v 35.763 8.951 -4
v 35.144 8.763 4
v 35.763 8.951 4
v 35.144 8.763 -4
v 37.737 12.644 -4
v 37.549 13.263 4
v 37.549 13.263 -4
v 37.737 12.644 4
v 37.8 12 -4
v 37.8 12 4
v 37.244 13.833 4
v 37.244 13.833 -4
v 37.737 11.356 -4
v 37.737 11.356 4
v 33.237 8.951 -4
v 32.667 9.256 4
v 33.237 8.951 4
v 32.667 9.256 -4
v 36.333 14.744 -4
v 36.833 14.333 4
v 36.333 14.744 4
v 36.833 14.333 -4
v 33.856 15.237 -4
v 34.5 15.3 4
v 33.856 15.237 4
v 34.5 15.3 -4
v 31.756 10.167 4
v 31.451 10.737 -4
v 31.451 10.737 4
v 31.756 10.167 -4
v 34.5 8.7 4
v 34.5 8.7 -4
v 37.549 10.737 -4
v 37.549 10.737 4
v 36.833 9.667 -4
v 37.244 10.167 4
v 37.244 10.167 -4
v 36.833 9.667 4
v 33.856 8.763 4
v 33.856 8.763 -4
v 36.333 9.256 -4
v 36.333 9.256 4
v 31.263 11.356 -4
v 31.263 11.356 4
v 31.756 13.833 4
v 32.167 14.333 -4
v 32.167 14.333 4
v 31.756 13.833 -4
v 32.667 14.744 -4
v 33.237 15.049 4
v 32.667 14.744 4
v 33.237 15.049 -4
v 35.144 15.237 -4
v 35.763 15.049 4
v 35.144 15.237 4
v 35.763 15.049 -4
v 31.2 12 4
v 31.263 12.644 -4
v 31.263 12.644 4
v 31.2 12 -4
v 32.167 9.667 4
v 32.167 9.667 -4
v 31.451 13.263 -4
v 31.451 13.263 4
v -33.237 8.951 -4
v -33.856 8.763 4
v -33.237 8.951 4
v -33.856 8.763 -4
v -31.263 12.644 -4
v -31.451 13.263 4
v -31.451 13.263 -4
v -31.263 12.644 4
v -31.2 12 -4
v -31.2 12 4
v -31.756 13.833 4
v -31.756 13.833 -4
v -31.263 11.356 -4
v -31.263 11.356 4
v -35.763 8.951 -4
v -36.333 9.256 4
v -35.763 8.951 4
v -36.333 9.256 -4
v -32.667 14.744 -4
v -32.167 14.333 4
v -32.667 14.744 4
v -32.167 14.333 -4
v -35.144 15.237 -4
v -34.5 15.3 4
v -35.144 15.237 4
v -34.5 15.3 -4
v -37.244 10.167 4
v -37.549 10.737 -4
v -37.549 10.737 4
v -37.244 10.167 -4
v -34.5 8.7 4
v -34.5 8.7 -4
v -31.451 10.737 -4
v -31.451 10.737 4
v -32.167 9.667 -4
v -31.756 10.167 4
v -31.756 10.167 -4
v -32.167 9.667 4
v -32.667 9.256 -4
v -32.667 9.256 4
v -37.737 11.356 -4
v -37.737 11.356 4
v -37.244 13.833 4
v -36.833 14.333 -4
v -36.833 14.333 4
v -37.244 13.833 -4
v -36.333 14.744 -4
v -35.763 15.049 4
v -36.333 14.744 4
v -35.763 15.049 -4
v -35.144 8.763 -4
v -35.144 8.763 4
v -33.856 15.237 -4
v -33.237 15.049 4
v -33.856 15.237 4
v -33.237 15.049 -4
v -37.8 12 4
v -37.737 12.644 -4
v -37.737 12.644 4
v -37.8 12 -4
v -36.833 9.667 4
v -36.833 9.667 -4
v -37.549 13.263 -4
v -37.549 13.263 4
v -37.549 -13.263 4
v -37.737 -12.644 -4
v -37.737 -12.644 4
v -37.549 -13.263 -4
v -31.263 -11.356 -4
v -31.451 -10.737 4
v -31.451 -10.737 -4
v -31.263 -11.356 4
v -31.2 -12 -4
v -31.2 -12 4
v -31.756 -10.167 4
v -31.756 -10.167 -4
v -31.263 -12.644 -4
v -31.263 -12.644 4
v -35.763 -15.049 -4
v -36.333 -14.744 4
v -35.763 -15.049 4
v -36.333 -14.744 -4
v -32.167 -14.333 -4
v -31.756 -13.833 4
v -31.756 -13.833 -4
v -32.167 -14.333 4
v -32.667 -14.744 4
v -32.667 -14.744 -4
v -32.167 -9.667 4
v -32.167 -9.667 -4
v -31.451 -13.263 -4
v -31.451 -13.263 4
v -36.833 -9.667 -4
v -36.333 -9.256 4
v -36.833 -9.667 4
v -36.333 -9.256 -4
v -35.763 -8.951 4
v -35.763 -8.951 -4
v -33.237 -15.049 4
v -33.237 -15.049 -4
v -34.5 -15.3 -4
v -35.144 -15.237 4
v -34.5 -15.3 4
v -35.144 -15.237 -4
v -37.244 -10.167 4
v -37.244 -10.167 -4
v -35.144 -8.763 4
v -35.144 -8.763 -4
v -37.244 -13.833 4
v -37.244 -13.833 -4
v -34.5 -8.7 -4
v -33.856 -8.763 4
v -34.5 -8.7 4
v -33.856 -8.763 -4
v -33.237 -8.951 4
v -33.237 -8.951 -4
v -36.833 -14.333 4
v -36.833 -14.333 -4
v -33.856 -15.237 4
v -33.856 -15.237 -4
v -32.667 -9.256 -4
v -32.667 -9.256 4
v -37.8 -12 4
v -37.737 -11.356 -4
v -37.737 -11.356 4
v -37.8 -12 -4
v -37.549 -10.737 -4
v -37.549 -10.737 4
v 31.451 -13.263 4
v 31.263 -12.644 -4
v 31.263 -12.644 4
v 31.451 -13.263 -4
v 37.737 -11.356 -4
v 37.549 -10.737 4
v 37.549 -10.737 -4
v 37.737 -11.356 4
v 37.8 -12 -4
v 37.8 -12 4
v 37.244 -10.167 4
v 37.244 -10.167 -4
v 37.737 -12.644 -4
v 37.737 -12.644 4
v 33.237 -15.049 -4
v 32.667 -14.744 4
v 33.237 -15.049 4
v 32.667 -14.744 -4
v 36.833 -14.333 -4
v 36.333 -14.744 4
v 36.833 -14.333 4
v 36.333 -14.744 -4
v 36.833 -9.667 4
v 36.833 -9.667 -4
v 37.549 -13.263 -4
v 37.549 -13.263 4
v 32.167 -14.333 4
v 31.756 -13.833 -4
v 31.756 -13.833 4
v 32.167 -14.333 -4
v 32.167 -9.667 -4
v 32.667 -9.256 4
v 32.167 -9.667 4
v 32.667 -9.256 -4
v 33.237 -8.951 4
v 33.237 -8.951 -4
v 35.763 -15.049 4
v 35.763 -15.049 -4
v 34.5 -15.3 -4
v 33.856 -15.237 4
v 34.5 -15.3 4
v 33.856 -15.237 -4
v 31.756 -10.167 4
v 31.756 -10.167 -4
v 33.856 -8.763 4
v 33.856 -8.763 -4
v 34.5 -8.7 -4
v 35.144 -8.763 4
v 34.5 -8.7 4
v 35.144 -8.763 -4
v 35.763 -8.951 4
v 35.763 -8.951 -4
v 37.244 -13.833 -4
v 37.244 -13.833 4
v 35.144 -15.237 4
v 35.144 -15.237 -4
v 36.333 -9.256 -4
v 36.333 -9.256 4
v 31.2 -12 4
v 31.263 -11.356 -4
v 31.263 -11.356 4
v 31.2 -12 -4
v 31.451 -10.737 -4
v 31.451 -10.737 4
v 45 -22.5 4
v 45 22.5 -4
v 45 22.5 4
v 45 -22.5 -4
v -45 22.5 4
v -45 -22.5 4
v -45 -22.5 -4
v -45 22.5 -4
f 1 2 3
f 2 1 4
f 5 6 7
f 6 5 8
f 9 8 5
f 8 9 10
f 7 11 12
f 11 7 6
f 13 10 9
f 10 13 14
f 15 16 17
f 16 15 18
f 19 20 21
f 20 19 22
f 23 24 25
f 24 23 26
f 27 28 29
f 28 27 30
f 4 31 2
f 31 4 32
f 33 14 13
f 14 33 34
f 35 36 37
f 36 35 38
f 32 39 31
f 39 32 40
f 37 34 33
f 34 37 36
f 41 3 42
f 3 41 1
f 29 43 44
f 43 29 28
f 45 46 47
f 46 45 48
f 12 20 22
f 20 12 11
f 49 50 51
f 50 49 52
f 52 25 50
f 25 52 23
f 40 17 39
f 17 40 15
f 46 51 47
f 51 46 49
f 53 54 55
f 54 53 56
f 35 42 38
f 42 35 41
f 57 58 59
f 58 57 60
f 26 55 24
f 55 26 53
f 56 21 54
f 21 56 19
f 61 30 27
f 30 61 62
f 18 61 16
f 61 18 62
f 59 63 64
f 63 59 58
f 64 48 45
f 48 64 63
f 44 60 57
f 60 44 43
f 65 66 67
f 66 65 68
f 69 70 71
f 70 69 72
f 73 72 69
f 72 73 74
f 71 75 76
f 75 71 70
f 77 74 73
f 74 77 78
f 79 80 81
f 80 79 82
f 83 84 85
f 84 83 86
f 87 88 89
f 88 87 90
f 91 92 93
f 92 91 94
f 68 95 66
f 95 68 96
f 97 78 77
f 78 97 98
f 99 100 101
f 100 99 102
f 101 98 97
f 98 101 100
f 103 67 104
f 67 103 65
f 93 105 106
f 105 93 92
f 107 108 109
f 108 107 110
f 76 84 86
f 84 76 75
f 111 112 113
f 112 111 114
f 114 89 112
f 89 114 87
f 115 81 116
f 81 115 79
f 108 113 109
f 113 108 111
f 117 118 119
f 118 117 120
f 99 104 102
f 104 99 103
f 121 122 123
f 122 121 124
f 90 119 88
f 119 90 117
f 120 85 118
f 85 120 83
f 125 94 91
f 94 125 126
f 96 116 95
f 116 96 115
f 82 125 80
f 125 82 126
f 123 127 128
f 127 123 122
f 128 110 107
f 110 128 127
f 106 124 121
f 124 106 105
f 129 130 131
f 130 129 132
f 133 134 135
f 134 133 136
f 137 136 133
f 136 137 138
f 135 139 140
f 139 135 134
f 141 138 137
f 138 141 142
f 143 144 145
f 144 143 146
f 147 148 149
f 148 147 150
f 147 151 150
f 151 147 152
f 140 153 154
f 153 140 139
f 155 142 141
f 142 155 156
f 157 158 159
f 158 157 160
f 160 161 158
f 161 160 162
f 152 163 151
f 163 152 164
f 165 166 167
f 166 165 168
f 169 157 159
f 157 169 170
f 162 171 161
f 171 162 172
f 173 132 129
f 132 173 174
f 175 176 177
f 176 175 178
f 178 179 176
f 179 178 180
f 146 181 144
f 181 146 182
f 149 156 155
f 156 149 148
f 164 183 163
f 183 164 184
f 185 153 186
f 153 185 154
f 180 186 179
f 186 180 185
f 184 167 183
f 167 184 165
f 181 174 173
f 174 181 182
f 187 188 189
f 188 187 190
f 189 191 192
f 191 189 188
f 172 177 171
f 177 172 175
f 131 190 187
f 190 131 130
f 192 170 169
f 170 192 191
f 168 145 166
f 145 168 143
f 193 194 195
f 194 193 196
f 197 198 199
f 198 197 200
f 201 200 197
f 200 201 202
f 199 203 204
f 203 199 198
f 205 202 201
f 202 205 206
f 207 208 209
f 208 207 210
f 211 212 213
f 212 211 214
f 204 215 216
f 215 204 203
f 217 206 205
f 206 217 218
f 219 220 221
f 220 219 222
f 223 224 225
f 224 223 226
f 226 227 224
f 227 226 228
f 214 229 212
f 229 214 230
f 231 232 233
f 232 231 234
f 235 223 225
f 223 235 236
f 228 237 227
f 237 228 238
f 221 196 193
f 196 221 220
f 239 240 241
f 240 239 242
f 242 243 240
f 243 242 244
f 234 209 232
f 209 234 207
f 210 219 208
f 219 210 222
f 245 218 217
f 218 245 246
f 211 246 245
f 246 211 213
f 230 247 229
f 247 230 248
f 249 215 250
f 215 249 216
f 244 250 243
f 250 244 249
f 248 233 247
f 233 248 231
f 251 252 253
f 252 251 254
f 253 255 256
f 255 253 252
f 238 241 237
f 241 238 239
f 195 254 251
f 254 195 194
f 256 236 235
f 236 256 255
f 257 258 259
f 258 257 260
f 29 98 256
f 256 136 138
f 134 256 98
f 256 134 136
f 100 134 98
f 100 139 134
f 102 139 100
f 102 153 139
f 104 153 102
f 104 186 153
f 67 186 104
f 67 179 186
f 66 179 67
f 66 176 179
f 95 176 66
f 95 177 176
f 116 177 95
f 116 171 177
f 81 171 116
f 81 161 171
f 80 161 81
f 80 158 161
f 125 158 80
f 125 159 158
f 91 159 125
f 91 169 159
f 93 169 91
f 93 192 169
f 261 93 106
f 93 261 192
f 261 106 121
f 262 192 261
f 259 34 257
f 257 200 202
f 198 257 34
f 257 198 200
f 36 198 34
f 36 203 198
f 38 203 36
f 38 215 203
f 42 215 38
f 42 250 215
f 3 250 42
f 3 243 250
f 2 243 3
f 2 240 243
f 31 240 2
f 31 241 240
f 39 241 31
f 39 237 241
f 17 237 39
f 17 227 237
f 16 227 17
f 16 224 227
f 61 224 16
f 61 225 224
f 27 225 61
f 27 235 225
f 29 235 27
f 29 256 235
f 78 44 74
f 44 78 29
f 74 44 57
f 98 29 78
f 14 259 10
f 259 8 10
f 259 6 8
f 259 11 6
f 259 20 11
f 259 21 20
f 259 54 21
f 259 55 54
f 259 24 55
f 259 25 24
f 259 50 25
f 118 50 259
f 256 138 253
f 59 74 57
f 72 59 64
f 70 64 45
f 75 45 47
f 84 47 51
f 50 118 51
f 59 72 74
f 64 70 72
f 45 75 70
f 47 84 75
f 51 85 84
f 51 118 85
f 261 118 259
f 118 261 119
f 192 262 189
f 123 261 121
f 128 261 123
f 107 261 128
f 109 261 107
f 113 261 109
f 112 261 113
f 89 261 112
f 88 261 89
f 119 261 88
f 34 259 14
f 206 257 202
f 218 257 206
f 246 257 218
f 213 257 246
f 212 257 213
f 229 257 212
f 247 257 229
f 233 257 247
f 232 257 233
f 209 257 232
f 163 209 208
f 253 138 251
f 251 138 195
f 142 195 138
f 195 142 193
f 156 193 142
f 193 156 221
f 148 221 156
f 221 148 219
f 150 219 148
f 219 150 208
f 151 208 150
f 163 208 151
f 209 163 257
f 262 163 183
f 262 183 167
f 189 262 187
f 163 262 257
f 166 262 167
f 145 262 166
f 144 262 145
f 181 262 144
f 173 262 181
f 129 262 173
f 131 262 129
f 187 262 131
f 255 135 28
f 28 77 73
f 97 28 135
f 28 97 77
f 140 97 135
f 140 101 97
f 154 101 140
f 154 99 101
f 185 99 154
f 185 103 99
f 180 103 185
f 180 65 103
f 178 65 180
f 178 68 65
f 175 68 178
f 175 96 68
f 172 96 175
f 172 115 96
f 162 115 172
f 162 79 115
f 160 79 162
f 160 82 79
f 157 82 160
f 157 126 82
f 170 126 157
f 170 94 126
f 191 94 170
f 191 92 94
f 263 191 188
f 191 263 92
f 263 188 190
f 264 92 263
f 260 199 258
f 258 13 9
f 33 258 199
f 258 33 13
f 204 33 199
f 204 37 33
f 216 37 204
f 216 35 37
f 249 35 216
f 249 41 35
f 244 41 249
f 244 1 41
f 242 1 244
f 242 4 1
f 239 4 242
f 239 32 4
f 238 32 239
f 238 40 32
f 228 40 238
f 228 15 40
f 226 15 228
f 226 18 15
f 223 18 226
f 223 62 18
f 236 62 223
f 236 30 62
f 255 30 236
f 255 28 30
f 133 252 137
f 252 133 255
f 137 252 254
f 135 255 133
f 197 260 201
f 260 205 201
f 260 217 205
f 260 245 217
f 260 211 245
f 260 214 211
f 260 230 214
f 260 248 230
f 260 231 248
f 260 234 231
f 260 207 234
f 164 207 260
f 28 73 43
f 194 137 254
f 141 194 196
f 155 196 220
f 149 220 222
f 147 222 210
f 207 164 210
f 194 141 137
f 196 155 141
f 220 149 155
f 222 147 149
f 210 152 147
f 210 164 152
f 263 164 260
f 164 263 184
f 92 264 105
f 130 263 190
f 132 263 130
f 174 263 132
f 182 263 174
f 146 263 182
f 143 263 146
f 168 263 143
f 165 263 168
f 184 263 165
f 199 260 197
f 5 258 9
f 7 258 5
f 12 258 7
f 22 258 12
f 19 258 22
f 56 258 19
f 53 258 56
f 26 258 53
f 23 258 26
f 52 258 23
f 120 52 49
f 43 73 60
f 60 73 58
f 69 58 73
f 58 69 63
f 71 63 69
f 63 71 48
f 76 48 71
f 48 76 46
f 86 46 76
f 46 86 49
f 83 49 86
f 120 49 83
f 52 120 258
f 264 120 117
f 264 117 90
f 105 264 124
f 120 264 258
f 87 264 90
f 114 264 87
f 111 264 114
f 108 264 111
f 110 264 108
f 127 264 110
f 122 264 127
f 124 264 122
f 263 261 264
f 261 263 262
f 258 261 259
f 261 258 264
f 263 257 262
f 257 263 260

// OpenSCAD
$fn = 32;

// ----------------------------------------------------------------------
// Corner plate 90 x 45 x 8
// 4 holes, centres taken from the edge offset
// ----------------------------------------------------------------------

// --- parameters (mm) ---
plate = [90, 45, 8];  // overall size (x, y, z)
holes = 4;            // number of holes the drawing asks for
hole_d = 6.6;         // hole diameter
edge = 10.5;          // hole centre offset from the plate edge

// --- derived feature positions (mm) ---
corner_x = plate[0] / 2 - edge;  // = 34.5   corner hole X
corner_y = plate[1] / 2 - edge;  // = 12   corner hole Y
feature_centers = [
  [corner_x, corner_y],
  [-corner_x, corner_y],
  [-corner_x, -corner_y],
  [corner_x, -corner_y]
];   // hole centres the loop below drills

// plate outline, every hole drilled through with the same cutters
difference() {
  cube(plate, center = true);
  for (centre = feature_centers)
    translate([centre[0], centre[1], 0])
      cylinder(d = hole_d, h = plate[2] + 2, center = true);
}
